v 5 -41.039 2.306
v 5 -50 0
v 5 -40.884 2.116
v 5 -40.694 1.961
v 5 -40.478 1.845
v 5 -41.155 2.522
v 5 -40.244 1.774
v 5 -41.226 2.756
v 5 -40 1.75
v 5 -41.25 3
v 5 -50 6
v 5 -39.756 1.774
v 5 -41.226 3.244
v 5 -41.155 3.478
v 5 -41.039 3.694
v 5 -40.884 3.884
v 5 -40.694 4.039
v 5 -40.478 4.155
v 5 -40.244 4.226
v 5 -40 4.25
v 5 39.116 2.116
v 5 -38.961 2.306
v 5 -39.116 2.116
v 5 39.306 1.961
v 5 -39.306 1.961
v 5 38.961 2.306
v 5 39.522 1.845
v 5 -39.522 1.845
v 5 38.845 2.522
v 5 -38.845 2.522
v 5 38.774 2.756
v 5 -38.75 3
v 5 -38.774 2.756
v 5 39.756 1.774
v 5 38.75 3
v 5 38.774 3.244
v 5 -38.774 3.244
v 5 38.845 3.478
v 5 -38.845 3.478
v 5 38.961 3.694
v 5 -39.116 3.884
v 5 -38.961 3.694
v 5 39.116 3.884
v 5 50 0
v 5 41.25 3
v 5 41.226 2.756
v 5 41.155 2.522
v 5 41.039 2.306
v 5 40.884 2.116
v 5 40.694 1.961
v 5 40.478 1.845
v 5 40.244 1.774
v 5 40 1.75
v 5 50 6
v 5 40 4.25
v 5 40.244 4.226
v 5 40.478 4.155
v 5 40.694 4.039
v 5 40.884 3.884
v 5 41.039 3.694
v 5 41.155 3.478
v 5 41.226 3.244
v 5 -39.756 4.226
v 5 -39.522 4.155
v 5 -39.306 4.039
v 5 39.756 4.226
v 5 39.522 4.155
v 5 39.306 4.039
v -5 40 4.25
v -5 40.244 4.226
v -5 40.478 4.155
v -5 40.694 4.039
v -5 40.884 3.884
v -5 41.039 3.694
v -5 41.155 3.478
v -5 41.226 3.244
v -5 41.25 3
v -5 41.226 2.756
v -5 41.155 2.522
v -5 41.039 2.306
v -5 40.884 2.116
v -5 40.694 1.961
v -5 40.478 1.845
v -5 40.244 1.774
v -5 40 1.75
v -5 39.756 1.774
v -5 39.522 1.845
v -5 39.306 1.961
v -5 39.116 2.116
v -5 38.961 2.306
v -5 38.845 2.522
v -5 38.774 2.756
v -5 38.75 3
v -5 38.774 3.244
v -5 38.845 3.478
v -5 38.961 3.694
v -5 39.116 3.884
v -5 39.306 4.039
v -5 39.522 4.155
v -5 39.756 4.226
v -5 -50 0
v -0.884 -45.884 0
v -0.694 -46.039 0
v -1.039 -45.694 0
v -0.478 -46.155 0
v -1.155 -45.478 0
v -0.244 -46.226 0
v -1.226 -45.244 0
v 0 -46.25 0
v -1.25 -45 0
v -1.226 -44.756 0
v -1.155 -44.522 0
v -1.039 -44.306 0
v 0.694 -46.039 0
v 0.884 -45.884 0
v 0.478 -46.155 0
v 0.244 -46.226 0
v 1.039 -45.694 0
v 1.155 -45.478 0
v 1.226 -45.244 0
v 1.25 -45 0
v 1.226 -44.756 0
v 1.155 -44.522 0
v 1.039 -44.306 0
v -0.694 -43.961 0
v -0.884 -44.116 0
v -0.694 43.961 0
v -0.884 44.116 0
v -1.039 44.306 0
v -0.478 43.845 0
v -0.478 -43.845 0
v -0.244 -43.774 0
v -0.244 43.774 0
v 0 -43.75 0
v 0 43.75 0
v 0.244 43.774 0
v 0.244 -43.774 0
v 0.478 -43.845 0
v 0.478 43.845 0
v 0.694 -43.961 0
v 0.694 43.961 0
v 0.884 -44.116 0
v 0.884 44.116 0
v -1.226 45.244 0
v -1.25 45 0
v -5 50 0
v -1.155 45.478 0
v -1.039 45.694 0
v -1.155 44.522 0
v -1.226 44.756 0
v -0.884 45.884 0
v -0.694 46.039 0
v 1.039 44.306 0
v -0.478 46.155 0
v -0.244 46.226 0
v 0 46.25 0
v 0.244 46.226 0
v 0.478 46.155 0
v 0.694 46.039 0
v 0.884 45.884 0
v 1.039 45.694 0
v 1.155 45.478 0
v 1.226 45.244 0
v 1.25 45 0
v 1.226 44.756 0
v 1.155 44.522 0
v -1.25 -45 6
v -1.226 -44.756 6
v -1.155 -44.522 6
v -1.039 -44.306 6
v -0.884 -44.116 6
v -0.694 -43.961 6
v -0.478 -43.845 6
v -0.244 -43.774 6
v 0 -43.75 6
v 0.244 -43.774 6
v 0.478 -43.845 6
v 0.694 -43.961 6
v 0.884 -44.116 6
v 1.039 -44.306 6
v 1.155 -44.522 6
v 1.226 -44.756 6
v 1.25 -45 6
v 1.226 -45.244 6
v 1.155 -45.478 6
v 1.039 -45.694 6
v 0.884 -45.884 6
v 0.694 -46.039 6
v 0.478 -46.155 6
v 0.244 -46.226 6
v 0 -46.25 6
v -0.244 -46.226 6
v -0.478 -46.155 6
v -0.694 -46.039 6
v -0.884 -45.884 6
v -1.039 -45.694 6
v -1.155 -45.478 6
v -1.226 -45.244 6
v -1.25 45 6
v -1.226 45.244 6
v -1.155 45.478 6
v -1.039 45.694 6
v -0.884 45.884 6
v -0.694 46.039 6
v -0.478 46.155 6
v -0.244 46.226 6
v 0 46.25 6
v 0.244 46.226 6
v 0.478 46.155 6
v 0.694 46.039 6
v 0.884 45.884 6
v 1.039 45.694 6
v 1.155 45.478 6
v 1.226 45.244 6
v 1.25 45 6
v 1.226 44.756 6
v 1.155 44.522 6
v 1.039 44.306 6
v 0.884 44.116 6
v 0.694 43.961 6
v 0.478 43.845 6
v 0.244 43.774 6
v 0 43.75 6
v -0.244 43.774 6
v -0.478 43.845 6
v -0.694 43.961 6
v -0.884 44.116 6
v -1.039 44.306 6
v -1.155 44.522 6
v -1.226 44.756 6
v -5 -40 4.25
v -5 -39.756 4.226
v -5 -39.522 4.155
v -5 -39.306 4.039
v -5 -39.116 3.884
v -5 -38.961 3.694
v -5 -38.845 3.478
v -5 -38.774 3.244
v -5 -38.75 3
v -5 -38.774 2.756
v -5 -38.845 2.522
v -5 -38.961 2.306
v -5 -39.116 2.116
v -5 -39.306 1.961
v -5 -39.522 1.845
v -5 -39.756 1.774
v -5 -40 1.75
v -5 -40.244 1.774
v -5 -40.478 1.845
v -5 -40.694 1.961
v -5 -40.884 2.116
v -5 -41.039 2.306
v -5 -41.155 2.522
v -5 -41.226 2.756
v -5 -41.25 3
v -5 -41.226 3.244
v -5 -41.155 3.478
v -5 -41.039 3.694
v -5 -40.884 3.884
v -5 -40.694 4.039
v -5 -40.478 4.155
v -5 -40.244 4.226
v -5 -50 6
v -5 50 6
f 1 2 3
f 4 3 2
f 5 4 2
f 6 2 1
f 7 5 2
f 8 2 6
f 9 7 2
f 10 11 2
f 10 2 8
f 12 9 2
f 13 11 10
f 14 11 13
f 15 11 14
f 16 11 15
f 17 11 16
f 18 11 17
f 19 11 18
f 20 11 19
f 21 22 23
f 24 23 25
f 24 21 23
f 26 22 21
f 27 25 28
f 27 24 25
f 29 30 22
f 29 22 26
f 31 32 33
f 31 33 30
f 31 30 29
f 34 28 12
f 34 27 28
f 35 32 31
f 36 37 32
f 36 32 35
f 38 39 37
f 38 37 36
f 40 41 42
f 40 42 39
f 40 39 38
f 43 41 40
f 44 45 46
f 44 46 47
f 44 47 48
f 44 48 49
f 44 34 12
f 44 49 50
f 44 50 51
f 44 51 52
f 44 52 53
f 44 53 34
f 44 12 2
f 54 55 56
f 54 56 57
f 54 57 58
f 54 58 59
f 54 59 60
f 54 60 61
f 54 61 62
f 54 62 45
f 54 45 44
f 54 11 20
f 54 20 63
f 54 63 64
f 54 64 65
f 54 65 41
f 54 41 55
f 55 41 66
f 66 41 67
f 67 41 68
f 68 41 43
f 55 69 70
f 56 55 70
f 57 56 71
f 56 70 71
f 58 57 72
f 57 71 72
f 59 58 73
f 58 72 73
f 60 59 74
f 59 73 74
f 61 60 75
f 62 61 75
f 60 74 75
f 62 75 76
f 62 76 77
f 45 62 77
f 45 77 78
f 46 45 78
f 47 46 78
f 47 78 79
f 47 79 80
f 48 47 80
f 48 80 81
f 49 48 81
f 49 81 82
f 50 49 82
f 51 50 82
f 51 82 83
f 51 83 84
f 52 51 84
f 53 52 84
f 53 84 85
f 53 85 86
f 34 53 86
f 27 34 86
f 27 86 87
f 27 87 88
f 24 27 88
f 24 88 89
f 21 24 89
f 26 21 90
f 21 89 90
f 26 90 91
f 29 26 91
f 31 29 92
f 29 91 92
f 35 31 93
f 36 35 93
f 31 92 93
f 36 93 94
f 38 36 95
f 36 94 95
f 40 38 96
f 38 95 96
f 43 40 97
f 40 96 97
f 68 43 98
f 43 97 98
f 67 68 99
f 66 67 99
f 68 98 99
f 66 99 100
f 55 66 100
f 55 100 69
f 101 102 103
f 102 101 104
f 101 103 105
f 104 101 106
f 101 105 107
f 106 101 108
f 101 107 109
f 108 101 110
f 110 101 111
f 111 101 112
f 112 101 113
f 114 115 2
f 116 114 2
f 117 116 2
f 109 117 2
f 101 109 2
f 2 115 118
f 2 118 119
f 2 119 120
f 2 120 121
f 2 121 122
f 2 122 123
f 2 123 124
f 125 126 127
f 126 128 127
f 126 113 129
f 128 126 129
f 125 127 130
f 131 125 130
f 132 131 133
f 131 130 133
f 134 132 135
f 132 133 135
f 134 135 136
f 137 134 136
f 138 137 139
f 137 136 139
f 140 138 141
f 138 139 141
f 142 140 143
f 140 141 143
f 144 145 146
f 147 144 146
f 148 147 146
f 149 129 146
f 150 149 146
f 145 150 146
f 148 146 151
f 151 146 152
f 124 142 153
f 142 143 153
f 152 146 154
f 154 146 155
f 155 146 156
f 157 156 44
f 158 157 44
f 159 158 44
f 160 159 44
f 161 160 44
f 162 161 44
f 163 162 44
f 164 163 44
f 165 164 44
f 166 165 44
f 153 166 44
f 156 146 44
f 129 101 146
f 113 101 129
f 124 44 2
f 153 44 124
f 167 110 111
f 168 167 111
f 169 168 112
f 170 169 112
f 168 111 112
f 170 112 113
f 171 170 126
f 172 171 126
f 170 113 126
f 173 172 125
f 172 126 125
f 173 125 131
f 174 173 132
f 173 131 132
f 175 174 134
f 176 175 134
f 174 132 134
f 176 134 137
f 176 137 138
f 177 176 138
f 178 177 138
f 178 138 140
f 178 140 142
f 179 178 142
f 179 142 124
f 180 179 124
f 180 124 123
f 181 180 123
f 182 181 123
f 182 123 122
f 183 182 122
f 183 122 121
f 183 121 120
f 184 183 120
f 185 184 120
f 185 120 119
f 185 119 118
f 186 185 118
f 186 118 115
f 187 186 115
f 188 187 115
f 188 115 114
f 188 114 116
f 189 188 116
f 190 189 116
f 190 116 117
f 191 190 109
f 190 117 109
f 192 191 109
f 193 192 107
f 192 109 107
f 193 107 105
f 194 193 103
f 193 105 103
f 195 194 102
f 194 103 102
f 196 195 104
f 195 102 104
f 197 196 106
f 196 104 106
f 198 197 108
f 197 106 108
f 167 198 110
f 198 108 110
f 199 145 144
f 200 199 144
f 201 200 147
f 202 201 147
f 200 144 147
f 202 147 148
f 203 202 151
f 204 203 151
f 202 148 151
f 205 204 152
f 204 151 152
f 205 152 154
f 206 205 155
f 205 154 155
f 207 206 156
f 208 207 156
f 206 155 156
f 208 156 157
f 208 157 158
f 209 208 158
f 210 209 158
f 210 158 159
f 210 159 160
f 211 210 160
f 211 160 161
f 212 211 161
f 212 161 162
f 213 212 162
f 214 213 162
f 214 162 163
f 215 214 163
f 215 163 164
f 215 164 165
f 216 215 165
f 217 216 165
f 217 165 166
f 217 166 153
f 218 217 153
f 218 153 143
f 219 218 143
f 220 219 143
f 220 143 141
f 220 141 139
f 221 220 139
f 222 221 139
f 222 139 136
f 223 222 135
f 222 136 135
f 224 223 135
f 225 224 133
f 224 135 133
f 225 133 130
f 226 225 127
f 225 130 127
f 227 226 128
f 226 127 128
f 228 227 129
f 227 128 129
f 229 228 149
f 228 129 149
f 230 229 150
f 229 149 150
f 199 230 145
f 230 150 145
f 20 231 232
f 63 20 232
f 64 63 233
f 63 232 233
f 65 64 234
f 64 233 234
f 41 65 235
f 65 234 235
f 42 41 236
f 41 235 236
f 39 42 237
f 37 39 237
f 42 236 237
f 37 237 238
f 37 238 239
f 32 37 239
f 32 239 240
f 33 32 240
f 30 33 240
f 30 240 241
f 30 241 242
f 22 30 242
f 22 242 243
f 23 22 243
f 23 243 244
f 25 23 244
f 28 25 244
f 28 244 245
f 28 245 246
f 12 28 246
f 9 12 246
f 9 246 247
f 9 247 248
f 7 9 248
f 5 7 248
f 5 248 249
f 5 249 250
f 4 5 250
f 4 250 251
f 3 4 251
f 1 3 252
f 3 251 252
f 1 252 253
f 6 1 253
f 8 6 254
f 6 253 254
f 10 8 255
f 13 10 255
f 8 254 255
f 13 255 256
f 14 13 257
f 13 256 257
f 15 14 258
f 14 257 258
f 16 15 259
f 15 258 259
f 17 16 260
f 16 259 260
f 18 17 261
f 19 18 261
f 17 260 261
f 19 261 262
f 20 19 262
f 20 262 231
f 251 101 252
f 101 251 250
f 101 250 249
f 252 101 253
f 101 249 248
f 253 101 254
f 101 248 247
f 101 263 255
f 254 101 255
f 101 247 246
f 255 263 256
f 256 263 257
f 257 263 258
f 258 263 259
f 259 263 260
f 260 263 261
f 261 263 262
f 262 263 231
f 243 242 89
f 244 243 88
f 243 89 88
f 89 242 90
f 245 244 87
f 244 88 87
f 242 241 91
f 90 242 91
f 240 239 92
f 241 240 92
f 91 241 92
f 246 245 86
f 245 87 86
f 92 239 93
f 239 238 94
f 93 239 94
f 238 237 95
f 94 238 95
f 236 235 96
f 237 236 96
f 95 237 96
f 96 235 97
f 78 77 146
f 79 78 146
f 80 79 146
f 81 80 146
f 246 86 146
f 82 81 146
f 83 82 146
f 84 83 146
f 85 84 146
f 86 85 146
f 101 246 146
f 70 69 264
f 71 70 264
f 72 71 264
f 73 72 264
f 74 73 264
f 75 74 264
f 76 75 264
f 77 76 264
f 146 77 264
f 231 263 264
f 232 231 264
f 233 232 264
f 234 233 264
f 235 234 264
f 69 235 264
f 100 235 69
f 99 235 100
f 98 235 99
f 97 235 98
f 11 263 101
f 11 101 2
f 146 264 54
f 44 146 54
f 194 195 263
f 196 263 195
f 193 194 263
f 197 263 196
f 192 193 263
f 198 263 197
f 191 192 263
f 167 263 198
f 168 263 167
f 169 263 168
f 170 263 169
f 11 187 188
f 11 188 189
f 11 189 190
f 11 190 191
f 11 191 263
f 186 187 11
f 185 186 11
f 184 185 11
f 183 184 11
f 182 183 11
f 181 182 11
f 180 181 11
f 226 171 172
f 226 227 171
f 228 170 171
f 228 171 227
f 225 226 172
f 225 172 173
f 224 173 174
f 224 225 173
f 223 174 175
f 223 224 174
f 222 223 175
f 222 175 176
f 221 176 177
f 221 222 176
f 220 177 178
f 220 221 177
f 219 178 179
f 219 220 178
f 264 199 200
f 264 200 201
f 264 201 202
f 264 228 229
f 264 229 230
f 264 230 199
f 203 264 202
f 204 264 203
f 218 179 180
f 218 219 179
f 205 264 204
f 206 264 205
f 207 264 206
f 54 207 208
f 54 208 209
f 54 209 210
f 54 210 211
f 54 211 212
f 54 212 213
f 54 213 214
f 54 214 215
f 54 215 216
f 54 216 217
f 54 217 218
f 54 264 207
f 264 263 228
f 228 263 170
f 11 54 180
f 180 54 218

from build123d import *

# Parameters (mm, degrees)
SKETCH1_W                  = 10
SKETCH1_H                  = 100
BOSS_EXTRUDE1_DEPTH        = 6
F_2_5_2_5_DIAMETER_HOLE1_D = 2.5
F_2_5_2_5_DIAMETER_HOLE2_D = 2.5


with BuildPart() as part:
    # Sketch1 → Boss-Extrude1 (new body)
    with BuildSketch(Plane.XY.offset(6)):
        Rectangle(SKETCH1_W, SKETCH1_H)
    extrude(amount=-BOSS_EXTRUDE1_DEPTH)

    # Ø2.5 (2.5) Diameter Hole1 (through all)
    with Locations(Plane.XY.offset(6)):
        with Locations((0, 45), (0, -45)):
            Hole(F_2_5_2_5_DIAMETER_HOLE1_D / 2)

    # Ø2.5 (2.5) Diameter Hole2 (through all)
    with Locations(Plane(origin=(5, 0, 0), x_dir=(0, 0, -1), z_dir=(1, 0, 0))):
        with Locations((-3, 40), (-3, -40)):
            Hole(F_2_5_2_5_DIAMETER_HOLE2_D / 2)


solid = part.part
